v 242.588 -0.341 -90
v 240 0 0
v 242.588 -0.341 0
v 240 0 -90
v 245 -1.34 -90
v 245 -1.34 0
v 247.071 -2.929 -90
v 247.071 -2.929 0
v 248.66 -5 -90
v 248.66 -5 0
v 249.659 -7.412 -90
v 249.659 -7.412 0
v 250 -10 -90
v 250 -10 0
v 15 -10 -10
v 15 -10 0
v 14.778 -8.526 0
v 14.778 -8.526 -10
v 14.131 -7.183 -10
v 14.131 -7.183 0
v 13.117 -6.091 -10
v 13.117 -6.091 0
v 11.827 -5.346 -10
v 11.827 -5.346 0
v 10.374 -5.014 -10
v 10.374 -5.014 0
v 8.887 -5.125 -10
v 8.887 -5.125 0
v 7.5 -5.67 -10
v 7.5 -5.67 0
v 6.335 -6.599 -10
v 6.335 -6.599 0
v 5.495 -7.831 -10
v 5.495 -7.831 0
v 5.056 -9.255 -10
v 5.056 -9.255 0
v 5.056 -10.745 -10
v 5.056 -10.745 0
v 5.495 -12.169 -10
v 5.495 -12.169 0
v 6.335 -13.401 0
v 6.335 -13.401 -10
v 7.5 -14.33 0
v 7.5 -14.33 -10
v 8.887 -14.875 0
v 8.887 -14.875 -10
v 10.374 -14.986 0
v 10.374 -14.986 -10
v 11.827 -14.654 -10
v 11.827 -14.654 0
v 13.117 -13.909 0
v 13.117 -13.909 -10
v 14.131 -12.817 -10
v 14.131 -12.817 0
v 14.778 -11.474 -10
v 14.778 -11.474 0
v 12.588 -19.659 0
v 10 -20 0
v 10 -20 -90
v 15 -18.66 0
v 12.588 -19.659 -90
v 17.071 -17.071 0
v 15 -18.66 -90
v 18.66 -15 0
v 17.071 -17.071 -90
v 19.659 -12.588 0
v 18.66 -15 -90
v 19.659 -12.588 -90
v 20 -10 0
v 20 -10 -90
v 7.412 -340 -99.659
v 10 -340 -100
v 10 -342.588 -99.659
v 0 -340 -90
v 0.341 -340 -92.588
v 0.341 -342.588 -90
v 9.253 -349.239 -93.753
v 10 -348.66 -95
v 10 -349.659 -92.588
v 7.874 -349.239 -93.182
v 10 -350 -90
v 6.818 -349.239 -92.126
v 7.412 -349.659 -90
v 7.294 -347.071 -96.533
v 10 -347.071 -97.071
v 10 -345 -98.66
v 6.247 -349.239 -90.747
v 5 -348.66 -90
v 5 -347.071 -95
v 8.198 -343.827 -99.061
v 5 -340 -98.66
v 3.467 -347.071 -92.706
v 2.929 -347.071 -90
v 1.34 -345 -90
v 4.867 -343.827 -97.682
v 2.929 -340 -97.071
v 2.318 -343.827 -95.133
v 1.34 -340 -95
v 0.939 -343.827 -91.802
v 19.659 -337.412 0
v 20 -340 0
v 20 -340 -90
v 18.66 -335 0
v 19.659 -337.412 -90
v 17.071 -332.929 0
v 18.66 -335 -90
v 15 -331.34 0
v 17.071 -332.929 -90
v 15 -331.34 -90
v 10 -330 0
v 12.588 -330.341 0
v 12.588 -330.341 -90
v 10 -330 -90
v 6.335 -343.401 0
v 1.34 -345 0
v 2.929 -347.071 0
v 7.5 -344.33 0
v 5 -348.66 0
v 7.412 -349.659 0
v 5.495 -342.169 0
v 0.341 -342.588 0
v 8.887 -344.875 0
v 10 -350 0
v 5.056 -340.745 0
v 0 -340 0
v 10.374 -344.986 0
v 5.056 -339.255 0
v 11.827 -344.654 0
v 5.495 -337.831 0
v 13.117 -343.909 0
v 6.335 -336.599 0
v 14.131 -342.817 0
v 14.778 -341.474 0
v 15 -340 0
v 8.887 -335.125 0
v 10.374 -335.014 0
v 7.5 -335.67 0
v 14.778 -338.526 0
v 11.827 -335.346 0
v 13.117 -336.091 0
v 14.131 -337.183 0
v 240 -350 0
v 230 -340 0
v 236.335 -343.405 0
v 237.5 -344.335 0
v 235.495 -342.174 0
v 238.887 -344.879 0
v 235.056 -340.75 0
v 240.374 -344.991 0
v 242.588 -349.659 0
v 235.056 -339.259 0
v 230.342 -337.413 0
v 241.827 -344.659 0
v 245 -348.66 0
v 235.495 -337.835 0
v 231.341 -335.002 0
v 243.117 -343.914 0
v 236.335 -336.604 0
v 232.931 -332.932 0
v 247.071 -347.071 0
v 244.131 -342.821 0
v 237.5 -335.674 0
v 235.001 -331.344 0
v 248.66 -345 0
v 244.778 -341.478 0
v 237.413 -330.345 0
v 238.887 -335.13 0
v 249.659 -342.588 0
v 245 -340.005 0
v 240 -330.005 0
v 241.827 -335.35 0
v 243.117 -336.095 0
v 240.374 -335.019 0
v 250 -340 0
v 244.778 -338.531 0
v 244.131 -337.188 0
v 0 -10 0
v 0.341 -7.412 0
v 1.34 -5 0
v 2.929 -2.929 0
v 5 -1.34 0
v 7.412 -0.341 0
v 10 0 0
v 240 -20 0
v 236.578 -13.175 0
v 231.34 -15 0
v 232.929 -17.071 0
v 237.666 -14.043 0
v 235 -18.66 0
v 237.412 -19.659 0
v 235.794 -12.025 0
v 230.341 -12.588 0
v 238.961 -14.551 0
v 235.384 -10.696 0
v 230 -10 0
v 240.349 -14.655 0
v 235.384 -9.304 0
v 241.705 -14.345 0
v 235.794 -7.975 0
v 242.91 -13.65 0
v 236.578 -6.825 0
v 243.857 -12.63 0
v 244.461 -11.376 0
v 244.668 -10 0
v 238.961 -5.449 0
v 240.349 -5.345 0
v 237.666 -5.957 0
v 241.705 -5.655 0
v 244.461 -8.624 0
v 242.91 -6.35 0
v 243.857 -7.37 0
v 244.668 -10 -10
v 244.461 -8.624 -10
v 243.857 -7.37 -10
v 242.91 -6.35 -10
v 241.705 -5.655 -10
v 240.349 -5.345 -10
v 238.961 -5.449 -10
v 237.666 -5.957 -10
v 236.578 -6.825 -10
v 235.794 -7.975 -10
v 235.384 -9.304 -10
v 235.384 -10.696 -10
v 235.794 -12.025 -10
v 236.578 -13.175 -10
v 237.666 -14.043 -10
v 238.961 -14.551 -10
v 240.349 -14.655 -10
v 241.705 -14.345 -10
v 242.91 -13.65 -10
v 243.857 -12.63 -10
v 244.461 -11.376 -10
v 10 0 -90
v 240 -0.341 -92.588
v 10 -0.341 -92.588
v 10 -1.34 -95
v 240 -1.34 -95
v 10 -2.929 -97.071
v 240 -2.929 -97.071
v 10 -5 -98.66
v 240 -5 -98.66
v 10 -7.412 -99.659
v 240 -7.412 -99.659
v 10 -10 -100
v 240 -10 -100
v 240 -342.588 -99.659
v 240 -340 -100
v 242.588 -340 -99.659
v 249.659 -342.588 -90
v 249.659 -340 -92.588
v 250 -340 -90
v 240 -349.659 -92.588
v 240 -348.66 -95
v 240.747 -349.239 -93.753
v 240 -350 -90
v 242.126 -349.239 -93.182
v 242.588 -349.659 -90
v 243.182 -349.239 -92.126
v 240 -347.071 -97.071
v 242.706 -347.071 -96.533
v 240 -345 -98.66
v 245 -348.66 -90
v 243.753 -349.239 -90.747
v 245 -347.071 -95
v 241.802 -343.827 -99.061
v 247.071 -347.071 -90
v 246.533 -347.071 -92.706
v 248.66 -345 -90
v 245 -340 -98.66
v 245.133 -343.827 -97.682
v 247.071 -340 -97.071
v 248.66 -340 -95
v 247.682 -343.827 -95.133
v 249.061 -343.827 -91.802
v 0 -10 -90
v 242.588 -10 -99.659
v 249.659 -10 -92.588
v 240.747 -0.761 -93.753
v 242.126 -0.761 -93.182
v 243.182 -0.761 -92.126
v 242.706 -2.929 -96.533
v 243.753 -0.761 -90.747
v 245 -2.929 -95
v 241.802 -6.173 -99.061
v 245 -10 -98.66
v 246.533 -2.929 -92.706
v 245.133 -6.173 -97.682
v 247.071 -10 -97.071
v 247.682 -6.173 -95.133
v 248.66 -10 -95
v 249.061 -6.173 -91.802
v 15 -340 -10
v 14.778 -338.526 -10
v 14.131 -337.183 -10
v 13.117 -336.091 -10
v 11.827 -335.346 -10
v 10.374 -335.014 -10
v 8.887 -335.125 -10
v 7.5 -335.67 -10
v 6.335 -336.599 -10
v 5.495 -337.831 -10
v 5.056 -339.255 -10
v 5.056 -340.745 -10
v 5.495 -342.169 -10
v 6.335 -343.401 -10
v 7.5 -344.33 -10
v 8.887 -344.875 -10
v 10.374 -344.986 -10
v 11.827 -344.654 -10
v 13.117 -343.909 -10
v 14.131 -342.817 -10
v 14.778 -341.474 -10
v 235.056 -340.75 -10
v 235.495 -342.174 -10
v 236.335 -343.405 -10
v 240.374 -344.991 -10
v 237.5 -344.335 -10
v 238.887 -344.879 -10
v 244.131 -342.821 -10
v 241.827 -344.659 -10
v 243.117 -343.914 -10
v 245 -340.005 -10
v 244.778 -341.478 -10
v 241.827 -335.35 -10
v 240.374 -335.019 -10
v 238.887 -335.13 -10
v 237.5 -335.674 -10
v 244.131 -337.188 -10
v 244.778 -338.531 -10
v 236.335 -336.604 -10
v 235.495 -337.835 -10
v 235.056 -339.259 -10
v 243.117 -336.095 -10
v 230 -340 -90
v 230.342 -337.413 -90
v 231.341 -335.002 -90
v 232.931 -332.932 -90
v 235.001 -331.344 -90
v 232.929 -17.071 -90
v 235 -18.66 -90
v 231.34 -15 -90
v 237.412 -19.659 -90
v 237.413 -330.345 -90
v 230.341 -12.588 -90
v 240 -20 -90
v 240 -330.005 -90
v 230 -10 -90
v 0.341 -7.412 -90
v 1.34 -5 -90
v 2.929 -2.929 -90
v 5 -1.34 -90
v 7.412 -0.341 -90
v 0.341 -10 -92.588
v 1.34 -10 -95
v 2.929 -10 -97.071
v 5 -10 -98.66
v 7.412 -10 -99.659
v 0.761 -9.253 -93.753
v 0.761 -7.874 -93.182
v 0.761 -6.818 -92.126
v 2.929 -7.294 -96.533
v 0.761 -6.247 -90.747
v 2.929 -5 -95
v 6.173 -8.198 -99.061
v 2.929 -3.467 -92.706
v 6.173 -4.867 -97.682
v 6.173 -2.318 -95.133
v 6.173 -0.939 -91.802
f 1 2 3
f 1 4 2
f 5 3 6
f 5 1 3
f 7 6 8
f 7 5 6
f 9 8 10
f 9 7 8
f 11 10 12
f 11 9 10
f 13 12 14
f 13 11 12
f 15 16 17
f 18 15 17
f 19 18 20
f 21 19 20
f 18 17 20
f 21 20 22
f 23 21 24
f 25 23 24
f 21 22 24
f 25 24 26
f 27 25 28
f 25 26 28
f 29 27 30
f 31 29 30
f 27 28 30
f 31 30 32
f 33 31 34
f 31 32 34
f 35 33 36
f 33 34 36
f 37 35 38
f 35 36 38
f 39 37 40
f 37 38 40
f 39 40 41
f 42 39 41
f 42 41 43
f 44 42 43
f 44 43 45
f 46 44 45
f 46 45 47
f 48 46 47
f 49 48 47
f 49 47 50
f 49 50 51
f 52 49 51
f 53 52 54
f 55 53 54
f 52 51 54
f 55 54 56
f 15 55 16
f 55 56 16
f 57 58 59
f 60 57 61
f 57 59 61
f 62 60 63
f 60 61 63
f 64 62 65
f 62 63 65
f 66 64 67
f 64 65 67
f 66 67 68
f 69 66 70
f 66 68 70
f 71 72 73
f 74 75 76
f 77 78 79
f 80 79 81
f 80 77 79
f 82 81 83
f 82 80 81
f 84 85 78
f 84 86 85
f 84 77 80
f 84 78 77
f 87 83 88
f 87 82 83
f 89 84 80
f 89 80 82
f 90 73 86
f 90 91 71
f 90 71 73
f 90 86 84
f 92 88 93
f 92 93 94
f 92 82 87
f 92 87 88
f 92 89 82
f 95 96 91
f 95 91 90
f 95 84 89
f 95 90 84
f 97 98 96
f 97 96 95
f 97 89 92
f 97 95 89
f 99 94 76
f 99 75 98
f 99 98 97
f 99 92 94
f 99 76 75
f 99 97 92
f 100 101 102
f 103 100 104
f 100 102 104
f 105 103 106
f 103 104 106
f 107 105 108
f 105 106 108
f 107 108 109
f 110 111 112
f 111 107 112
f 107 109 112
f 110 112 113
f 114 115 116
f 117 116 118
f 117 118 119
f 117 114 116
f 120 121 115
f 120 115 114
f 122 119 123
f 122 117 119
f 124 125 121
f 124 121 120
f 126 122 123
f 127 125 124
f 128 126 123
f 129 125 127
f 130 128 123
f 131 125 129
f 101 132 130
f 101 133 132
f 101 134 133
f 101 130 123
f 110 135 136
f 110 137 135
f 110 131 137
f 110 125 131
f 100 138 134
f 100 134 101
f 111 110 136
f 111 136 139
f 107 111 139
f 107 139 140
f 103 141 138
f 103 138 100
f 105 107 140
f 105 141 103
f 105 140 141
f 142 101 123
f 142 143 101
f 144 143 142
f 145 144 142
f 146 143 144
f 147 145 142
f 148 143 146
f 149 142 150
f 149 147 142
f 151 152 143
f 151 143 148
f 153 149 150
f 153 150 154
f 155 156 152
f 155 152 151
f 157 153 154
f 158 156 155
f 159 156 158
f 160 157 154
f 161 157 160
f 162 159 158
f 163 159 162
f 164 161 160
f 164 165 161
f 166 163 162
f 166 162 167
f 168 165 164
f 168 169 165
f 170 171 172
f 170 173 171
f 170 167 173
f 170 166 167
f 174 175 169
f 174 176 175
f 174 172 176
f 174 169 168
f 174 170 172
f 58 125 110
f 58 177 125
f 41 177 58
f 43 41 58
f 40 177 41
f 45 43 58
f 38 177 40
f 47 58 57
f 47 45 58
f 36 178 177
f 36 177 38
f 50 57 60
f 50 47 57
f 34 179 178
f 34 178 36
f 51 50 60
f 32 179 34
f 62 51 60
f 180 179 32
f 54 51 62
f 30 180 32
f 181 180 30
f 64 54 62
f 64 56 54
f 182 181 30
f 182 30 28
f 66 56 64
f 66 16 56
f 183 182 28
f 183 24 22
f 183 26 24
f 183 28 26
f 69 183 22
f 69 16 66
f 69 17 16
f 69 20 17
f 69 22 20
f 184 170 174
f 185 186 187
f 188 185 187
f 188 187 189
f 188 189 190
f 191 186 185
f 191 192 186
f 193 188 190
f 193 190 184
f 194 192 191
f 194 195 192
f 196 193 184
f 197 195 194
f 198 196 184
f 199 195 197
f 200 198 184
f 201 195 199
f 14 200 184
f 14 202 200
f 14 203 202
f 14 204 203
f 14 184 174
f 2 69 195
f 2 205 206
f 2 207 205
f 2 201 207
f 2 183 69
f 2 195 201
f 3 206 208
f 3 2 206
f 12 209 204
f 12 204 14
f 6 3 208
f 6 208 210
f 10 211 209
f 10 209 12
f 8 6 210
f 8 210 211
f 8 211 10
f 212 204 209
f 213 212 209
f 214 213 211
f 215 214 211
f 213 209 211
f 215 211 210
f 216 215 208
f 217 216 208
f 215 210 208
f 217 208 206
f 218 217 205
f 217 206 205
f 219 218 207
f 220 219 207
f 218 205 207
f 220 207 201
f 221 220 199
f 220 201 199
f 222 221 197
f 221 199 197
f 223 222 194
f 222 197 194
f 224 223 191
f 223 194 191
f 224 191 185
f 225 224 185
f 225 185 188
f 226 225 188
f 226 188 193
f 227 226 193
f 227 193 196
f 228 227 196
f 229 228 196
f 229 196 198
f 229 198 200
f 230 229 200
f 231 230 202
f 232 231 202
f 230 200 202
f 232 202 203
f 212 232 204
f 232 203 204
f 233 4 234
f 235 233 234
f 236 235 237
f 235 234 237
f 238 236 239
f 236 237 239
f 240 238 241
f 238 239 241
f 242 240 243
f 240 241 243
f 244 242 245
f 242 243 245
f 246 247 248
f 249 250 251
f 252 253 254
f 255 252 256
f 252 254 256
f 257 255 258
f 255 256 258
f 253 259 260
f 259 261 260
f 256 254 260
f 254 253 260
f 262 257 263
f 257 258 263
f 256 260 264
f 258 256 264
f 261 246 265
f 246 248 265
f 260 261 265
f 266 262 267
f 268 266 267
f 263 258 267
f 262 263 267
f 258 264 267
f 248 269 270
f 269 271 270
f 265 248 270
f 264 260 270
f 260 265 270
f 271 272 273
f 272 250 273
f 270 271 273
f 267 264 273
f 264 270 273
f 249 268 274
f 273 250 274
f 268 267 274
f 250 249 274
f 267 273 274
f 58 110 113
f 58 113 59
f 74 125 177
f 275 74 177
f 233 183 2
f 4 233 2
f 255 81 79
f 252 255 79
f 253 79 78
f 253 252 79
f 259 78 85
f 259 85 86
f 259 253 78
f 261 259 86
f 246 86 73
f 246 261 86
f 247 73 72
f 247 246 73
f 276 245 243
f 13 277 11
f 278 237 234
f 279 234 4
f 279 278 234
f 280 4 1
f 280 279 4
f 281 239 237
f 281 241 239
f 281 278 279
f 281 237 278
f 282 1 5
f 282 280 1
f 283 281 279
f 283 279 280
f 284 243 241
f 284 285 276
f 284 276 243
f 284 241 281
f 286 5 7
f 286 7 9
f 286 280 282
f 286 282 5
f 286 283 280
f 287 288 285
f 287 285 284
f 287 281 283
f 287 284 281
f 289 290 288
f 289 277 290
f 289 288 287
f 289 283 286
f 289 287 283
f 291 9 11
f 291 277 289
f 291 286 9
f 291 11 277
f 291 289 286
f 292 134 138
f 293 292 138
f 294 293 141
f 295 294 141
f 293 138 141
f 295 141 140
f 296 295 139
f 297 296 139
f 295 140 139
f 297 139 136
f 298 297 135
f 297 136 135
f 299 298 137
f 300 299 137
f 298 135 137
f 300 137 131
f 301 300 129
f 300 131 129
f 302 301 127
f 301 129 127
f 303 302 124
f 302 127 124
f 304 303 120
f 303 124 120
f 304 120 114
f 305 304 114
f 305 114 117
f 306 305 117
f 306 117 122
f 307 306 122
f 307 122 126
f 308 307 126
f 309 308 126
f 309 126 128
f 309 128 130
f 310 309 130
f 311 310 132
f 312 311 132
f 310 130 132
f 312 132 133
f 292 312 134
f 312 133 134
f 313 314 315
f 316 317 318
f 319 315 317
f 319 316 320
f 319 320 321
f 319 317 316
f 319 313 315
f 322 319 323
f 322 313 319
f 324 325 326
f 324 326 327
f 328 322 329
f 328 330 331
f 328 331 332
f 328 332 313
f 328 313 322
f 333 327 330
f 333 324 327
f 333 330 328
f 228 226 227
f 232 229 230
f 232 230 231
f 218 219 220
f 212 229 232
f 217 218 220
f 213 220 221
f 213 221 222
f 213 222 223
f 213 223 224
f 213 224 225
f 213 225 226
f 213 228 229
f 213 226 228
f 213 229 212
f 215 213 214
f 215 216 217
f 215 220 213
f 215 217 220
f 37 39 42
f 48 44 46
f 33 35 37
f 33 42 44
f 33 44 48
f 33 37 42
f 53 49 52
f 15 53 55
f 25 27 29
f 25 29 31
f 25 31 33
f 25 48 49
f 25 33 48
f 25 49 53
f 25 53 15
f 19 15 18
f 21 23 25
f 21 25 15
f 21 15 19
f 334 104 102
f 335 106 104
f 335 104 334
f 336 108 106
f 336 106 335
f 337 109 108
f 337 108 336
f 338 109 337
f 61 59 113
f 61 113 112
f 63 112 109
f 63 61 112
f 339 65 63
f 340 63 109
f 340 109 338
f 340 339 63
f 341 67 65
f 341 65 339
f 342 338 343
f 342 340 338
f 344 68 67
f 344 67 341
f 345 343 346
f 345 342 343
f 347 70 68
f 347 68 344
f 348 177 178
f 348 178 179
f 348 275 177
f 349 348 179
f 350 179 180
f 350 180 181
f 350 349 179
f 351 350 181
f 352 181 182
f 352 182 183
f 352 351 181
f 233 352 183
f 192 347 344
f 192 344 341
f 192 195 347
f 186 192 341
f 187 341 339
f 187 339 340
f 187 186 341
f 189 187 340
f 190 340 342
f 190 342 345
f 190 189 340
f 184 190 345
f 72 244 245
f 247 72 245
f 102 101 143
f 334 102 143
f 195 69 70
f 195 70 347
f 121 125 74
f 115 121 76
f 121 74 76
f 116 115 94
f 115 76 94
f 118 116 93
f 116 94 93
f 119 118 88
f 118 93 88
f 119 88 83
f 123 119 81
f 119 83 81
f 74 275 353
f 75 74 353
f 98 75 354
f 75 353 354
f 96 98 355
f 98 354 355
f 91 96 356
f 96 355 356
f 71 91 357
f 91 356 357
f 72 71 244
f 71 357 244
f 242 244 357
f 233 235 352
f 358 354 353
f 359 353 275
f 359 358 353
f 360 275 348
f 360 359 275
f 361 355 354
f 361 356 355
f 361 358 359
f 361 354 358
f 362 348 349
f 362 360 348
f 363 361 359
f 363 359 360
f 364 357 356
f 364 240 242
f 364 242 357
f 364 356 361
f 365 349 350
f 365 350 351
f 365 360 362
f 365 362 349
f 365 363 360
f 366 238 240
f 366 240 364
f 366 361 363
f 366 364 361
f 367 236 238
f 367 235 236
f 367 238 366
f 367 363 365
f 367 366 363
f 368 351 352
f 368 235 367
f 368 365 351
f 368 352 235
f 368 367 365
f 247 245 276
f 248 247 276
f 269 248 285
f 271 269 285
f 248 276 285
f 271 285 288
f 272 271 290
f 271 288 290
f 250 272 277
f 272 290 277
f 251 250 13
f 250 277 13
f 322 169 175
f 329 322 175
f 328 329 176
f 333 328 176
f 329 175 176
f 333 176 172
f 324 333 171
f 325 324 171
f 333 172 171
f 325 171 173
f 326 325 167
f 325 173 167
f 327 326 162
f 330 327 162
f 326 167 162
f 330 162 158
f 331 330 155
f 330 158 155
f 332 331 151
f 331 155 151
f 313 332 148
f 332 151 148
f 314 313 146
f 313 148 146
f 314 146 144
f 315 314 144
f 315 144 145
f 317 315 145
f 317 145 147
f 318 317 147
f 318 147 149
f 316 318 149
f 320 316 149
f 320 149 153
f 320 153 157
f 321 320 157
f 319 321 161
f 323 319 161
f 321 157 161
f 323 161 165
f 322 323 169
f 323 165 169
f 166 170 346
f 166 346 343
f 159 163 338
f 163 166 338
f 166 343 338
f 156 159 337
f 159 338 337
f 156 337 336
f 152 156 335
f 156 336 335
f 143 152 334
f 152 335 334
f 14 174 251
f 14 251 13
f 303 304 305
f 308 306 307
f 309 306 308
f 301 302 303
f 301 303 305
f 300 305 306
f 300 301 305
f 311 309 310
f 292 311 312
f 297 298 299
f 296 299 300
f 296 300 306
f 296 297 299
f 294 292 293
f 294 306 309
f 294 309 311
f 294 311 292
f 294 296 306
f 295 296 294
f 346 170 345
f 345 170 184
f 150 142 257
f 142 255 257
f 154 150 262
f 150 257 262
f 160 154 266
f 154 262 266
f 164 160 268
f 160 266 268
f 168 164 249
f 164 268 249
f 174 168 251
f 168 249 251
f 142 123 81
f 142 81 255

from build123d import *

# Parameters (mm, degrees)
SKETCH1_W           = 250
SKETCH1_H           = 350
BOSS_EXTRUDE1_DEPTH = 100
SKETCH2_W           = 230
SKETCH2_H           = 330
CUT_EXTRUDE1_DEPTH  = 90
FILLET1_R           = 10
SKETCH3_W           = 10
SKETCH3_H           = 10
BOSS_EXTRUDE2_DEPTH = 90
SKETCH4_W           = 10
SKETCH4_H           = 9.995398269
BOSS_EXTRUDE3_DEPTH = 90
SKETCH5_W           = 10
SKETCH5_H           = 10
BOSS_EXTRUDE4_DEPTH = 90
FILLET2_R           = 10
FILLET3_R           = 10
SKETCH6_R           = 4.668020142
CUT_EXTRUDE2_DEPTH  = 10
SKETCH7_R           = 5
CUT_EXTRUDE3_DEPTH  = 10
SKETCH8_R           = 5
CUT_EXTRUDE4_DEPTH  = 10
SKETCH9_R           = 5
CUT_EXTRUDE5_DEPTH  = 10


# Some blends are built 0.0001 mm under size
with BuildPart() as part:
    # Sketch1 → Boss-Extrude1 (new body)
    with BuildSketch(Plane.XY):
        with Locations((125, -175)):
            Rectangle(SKETCH1_W, SKETCH1_H)
    extrude(amount=-BOSS_EXTRUDE1_DEPTH)

    # Sketch2 → Cut-Extrude1 (cut)
    with BuildSketch(Plane.XY):
        with Locations((125, -175)):
            Rectangle(SKETCH2_W, SKETCH2_H)
    extrude(amount=-CUT_EXTRUDE1_DEPTH, mode=Mode.SUBTRACT)

    # Fillet1
    fillet1_edges = [part.edges().sort_by_distance(p)[0] for p in [
        (250, -175, -100),
        (125, 0, -100),
        (0, -175, -100),
        (125, -350, -100),
        (0, 0, -50),
        (250, 0, -50),
        (250, -350, -50),
        (0, -350, -50),
    ]]
    fillet(fillet1_edges, radius=FILLET1_R)

    # Sketch3 → Boss-Extrude2 (add)
    with BuildSketch(Plane.XY.offset(-90)):
        with Locations((15, -335)):
            Rectangle(SKETCH3_W, SKETCH3_H)
    extrude(amount=BOSS_EXTRUDE2_DEPTH)

    # Sketch4 → Boss-Extrude3 (add)
    with BuildSketch(Plane.XY.offset(-90)):
        with Locations((235, -335.002300866)):
            Rectangle(SKETCH4_W, SKETCH4_H)
    extrude(amount=BOSS_EXTRUDE3_DEPTH)

    # Sketch5 → Boss-Extrude4 (add)
    with BuildSketch(Plane.XY.offset(-90)):
        with Locations((235, -15)):
            Rectangle(SKETCH5_W, SKETCH5_H)
        with Locations((15, -15)):
            Rectangle(SKETCH5_W, SKETCH5_H)
    extrude(amount=BOSS_EXTRUDE4_DEPTH)

    # Fillet2
    fillet2_edges = [part.edges().sort_by_distance(p)[0] for p in [
        (230, -20, -45),
    ]]
    fillet(fillet2_edges, radius=FILLET2_R - 0.0001)  # a hair under: the kernel refuses the full size

    # Fillet3
    # the kernel refuses this fillet: 10 mm, written as the material it takes off along each edge
    with BuildSketch(Plane(origin=(230, -330.004601731, -90), x_dir=(1, 0, 0), z_dir=(0, 0, 1))) as fillet3_piece_1:
        with BuildLine():
            CenterArc((9.999998941, -10), FILLET3_R, 90, 89.973634023)
            Line((0, -9.995398269), (0, 0))
            Line((0, 0), (9.999998941, 0))
        make_face()
    extrude(amount=114.999997353, mode=Mode.SUBTRACT)
    with BuildSketch(Plane(origin=(20, -330, -90), x_dir=(0, -1, 0), z_dir=(0, 0, 1))) as fillet3_piece_2:
        with BuildLine():
            CenterArc((FILLET3_R, -FILLET3_R), FILLET3_R, 90, 90)
            Line((0, -FILLET3_R), (0, 0))
            Line((0, 0), (FILLET3_R, 0))
        make_face()
    extrude(amount=115, mode=Mode.SUBTRACT)
    with BuildSketch(Plane(origin=(20, -20, -90), x_dir=(0, 1, 0), z_dir=(0, 0, 1))) as fillet3_piece_3:
        with BuildLine():
            CenterArc((FILLET3_R, FILLET3_R), FILLET3_R, 180, 90)
            Line((0, FILLET3_R), (0, 0))
            Line((0, 0), (FILLET3_R, 0))
        make_face()
    extrude(amount=115, mode=Mode.SUBTRACT)

    # Sketch6 → Cut-Extrude2 (cut)
    with BuildSketch(Plane.XY):
        with Locations((240, -10)):
            Circle(SKETCH6_R)
    extrude(amount=-CUT_EXTRUDE2_DEPTH, mode=Mode.SUBTRACT)

    # Sketch7 → Cut-Extrude3 (cut)
    with BuildSketch(Plane.XY):
        with Locations((10, -10)):
            Circle(SKETCH7_R)
    extrude(amount=-CUT_EXTRUDE3_DEPTH, mode=Mode.SUBTRACT)

    # Sketch8 → Cut-Extrude4 (cut)
    with BuildSketch(Plane.XY):
        with Locations((239.999998941, -340.004601731)):
            Circle(SKETCH8_R)
    extrude(amount=-CUT_EXTRUDE4_DEPTH, mode=Mode.SUBTRACT)

    # Sketch9 → Cut-Extrude5 (cut)
    with BuildSketch(Plane.XY):
        with Locations((10, -340)):
            Circle(SKETCH9_R)
    extrude(amount=-CUT_EXTRUDE5_DEPTH, mode=Mode.SUBTRACT)


solid = part.part
